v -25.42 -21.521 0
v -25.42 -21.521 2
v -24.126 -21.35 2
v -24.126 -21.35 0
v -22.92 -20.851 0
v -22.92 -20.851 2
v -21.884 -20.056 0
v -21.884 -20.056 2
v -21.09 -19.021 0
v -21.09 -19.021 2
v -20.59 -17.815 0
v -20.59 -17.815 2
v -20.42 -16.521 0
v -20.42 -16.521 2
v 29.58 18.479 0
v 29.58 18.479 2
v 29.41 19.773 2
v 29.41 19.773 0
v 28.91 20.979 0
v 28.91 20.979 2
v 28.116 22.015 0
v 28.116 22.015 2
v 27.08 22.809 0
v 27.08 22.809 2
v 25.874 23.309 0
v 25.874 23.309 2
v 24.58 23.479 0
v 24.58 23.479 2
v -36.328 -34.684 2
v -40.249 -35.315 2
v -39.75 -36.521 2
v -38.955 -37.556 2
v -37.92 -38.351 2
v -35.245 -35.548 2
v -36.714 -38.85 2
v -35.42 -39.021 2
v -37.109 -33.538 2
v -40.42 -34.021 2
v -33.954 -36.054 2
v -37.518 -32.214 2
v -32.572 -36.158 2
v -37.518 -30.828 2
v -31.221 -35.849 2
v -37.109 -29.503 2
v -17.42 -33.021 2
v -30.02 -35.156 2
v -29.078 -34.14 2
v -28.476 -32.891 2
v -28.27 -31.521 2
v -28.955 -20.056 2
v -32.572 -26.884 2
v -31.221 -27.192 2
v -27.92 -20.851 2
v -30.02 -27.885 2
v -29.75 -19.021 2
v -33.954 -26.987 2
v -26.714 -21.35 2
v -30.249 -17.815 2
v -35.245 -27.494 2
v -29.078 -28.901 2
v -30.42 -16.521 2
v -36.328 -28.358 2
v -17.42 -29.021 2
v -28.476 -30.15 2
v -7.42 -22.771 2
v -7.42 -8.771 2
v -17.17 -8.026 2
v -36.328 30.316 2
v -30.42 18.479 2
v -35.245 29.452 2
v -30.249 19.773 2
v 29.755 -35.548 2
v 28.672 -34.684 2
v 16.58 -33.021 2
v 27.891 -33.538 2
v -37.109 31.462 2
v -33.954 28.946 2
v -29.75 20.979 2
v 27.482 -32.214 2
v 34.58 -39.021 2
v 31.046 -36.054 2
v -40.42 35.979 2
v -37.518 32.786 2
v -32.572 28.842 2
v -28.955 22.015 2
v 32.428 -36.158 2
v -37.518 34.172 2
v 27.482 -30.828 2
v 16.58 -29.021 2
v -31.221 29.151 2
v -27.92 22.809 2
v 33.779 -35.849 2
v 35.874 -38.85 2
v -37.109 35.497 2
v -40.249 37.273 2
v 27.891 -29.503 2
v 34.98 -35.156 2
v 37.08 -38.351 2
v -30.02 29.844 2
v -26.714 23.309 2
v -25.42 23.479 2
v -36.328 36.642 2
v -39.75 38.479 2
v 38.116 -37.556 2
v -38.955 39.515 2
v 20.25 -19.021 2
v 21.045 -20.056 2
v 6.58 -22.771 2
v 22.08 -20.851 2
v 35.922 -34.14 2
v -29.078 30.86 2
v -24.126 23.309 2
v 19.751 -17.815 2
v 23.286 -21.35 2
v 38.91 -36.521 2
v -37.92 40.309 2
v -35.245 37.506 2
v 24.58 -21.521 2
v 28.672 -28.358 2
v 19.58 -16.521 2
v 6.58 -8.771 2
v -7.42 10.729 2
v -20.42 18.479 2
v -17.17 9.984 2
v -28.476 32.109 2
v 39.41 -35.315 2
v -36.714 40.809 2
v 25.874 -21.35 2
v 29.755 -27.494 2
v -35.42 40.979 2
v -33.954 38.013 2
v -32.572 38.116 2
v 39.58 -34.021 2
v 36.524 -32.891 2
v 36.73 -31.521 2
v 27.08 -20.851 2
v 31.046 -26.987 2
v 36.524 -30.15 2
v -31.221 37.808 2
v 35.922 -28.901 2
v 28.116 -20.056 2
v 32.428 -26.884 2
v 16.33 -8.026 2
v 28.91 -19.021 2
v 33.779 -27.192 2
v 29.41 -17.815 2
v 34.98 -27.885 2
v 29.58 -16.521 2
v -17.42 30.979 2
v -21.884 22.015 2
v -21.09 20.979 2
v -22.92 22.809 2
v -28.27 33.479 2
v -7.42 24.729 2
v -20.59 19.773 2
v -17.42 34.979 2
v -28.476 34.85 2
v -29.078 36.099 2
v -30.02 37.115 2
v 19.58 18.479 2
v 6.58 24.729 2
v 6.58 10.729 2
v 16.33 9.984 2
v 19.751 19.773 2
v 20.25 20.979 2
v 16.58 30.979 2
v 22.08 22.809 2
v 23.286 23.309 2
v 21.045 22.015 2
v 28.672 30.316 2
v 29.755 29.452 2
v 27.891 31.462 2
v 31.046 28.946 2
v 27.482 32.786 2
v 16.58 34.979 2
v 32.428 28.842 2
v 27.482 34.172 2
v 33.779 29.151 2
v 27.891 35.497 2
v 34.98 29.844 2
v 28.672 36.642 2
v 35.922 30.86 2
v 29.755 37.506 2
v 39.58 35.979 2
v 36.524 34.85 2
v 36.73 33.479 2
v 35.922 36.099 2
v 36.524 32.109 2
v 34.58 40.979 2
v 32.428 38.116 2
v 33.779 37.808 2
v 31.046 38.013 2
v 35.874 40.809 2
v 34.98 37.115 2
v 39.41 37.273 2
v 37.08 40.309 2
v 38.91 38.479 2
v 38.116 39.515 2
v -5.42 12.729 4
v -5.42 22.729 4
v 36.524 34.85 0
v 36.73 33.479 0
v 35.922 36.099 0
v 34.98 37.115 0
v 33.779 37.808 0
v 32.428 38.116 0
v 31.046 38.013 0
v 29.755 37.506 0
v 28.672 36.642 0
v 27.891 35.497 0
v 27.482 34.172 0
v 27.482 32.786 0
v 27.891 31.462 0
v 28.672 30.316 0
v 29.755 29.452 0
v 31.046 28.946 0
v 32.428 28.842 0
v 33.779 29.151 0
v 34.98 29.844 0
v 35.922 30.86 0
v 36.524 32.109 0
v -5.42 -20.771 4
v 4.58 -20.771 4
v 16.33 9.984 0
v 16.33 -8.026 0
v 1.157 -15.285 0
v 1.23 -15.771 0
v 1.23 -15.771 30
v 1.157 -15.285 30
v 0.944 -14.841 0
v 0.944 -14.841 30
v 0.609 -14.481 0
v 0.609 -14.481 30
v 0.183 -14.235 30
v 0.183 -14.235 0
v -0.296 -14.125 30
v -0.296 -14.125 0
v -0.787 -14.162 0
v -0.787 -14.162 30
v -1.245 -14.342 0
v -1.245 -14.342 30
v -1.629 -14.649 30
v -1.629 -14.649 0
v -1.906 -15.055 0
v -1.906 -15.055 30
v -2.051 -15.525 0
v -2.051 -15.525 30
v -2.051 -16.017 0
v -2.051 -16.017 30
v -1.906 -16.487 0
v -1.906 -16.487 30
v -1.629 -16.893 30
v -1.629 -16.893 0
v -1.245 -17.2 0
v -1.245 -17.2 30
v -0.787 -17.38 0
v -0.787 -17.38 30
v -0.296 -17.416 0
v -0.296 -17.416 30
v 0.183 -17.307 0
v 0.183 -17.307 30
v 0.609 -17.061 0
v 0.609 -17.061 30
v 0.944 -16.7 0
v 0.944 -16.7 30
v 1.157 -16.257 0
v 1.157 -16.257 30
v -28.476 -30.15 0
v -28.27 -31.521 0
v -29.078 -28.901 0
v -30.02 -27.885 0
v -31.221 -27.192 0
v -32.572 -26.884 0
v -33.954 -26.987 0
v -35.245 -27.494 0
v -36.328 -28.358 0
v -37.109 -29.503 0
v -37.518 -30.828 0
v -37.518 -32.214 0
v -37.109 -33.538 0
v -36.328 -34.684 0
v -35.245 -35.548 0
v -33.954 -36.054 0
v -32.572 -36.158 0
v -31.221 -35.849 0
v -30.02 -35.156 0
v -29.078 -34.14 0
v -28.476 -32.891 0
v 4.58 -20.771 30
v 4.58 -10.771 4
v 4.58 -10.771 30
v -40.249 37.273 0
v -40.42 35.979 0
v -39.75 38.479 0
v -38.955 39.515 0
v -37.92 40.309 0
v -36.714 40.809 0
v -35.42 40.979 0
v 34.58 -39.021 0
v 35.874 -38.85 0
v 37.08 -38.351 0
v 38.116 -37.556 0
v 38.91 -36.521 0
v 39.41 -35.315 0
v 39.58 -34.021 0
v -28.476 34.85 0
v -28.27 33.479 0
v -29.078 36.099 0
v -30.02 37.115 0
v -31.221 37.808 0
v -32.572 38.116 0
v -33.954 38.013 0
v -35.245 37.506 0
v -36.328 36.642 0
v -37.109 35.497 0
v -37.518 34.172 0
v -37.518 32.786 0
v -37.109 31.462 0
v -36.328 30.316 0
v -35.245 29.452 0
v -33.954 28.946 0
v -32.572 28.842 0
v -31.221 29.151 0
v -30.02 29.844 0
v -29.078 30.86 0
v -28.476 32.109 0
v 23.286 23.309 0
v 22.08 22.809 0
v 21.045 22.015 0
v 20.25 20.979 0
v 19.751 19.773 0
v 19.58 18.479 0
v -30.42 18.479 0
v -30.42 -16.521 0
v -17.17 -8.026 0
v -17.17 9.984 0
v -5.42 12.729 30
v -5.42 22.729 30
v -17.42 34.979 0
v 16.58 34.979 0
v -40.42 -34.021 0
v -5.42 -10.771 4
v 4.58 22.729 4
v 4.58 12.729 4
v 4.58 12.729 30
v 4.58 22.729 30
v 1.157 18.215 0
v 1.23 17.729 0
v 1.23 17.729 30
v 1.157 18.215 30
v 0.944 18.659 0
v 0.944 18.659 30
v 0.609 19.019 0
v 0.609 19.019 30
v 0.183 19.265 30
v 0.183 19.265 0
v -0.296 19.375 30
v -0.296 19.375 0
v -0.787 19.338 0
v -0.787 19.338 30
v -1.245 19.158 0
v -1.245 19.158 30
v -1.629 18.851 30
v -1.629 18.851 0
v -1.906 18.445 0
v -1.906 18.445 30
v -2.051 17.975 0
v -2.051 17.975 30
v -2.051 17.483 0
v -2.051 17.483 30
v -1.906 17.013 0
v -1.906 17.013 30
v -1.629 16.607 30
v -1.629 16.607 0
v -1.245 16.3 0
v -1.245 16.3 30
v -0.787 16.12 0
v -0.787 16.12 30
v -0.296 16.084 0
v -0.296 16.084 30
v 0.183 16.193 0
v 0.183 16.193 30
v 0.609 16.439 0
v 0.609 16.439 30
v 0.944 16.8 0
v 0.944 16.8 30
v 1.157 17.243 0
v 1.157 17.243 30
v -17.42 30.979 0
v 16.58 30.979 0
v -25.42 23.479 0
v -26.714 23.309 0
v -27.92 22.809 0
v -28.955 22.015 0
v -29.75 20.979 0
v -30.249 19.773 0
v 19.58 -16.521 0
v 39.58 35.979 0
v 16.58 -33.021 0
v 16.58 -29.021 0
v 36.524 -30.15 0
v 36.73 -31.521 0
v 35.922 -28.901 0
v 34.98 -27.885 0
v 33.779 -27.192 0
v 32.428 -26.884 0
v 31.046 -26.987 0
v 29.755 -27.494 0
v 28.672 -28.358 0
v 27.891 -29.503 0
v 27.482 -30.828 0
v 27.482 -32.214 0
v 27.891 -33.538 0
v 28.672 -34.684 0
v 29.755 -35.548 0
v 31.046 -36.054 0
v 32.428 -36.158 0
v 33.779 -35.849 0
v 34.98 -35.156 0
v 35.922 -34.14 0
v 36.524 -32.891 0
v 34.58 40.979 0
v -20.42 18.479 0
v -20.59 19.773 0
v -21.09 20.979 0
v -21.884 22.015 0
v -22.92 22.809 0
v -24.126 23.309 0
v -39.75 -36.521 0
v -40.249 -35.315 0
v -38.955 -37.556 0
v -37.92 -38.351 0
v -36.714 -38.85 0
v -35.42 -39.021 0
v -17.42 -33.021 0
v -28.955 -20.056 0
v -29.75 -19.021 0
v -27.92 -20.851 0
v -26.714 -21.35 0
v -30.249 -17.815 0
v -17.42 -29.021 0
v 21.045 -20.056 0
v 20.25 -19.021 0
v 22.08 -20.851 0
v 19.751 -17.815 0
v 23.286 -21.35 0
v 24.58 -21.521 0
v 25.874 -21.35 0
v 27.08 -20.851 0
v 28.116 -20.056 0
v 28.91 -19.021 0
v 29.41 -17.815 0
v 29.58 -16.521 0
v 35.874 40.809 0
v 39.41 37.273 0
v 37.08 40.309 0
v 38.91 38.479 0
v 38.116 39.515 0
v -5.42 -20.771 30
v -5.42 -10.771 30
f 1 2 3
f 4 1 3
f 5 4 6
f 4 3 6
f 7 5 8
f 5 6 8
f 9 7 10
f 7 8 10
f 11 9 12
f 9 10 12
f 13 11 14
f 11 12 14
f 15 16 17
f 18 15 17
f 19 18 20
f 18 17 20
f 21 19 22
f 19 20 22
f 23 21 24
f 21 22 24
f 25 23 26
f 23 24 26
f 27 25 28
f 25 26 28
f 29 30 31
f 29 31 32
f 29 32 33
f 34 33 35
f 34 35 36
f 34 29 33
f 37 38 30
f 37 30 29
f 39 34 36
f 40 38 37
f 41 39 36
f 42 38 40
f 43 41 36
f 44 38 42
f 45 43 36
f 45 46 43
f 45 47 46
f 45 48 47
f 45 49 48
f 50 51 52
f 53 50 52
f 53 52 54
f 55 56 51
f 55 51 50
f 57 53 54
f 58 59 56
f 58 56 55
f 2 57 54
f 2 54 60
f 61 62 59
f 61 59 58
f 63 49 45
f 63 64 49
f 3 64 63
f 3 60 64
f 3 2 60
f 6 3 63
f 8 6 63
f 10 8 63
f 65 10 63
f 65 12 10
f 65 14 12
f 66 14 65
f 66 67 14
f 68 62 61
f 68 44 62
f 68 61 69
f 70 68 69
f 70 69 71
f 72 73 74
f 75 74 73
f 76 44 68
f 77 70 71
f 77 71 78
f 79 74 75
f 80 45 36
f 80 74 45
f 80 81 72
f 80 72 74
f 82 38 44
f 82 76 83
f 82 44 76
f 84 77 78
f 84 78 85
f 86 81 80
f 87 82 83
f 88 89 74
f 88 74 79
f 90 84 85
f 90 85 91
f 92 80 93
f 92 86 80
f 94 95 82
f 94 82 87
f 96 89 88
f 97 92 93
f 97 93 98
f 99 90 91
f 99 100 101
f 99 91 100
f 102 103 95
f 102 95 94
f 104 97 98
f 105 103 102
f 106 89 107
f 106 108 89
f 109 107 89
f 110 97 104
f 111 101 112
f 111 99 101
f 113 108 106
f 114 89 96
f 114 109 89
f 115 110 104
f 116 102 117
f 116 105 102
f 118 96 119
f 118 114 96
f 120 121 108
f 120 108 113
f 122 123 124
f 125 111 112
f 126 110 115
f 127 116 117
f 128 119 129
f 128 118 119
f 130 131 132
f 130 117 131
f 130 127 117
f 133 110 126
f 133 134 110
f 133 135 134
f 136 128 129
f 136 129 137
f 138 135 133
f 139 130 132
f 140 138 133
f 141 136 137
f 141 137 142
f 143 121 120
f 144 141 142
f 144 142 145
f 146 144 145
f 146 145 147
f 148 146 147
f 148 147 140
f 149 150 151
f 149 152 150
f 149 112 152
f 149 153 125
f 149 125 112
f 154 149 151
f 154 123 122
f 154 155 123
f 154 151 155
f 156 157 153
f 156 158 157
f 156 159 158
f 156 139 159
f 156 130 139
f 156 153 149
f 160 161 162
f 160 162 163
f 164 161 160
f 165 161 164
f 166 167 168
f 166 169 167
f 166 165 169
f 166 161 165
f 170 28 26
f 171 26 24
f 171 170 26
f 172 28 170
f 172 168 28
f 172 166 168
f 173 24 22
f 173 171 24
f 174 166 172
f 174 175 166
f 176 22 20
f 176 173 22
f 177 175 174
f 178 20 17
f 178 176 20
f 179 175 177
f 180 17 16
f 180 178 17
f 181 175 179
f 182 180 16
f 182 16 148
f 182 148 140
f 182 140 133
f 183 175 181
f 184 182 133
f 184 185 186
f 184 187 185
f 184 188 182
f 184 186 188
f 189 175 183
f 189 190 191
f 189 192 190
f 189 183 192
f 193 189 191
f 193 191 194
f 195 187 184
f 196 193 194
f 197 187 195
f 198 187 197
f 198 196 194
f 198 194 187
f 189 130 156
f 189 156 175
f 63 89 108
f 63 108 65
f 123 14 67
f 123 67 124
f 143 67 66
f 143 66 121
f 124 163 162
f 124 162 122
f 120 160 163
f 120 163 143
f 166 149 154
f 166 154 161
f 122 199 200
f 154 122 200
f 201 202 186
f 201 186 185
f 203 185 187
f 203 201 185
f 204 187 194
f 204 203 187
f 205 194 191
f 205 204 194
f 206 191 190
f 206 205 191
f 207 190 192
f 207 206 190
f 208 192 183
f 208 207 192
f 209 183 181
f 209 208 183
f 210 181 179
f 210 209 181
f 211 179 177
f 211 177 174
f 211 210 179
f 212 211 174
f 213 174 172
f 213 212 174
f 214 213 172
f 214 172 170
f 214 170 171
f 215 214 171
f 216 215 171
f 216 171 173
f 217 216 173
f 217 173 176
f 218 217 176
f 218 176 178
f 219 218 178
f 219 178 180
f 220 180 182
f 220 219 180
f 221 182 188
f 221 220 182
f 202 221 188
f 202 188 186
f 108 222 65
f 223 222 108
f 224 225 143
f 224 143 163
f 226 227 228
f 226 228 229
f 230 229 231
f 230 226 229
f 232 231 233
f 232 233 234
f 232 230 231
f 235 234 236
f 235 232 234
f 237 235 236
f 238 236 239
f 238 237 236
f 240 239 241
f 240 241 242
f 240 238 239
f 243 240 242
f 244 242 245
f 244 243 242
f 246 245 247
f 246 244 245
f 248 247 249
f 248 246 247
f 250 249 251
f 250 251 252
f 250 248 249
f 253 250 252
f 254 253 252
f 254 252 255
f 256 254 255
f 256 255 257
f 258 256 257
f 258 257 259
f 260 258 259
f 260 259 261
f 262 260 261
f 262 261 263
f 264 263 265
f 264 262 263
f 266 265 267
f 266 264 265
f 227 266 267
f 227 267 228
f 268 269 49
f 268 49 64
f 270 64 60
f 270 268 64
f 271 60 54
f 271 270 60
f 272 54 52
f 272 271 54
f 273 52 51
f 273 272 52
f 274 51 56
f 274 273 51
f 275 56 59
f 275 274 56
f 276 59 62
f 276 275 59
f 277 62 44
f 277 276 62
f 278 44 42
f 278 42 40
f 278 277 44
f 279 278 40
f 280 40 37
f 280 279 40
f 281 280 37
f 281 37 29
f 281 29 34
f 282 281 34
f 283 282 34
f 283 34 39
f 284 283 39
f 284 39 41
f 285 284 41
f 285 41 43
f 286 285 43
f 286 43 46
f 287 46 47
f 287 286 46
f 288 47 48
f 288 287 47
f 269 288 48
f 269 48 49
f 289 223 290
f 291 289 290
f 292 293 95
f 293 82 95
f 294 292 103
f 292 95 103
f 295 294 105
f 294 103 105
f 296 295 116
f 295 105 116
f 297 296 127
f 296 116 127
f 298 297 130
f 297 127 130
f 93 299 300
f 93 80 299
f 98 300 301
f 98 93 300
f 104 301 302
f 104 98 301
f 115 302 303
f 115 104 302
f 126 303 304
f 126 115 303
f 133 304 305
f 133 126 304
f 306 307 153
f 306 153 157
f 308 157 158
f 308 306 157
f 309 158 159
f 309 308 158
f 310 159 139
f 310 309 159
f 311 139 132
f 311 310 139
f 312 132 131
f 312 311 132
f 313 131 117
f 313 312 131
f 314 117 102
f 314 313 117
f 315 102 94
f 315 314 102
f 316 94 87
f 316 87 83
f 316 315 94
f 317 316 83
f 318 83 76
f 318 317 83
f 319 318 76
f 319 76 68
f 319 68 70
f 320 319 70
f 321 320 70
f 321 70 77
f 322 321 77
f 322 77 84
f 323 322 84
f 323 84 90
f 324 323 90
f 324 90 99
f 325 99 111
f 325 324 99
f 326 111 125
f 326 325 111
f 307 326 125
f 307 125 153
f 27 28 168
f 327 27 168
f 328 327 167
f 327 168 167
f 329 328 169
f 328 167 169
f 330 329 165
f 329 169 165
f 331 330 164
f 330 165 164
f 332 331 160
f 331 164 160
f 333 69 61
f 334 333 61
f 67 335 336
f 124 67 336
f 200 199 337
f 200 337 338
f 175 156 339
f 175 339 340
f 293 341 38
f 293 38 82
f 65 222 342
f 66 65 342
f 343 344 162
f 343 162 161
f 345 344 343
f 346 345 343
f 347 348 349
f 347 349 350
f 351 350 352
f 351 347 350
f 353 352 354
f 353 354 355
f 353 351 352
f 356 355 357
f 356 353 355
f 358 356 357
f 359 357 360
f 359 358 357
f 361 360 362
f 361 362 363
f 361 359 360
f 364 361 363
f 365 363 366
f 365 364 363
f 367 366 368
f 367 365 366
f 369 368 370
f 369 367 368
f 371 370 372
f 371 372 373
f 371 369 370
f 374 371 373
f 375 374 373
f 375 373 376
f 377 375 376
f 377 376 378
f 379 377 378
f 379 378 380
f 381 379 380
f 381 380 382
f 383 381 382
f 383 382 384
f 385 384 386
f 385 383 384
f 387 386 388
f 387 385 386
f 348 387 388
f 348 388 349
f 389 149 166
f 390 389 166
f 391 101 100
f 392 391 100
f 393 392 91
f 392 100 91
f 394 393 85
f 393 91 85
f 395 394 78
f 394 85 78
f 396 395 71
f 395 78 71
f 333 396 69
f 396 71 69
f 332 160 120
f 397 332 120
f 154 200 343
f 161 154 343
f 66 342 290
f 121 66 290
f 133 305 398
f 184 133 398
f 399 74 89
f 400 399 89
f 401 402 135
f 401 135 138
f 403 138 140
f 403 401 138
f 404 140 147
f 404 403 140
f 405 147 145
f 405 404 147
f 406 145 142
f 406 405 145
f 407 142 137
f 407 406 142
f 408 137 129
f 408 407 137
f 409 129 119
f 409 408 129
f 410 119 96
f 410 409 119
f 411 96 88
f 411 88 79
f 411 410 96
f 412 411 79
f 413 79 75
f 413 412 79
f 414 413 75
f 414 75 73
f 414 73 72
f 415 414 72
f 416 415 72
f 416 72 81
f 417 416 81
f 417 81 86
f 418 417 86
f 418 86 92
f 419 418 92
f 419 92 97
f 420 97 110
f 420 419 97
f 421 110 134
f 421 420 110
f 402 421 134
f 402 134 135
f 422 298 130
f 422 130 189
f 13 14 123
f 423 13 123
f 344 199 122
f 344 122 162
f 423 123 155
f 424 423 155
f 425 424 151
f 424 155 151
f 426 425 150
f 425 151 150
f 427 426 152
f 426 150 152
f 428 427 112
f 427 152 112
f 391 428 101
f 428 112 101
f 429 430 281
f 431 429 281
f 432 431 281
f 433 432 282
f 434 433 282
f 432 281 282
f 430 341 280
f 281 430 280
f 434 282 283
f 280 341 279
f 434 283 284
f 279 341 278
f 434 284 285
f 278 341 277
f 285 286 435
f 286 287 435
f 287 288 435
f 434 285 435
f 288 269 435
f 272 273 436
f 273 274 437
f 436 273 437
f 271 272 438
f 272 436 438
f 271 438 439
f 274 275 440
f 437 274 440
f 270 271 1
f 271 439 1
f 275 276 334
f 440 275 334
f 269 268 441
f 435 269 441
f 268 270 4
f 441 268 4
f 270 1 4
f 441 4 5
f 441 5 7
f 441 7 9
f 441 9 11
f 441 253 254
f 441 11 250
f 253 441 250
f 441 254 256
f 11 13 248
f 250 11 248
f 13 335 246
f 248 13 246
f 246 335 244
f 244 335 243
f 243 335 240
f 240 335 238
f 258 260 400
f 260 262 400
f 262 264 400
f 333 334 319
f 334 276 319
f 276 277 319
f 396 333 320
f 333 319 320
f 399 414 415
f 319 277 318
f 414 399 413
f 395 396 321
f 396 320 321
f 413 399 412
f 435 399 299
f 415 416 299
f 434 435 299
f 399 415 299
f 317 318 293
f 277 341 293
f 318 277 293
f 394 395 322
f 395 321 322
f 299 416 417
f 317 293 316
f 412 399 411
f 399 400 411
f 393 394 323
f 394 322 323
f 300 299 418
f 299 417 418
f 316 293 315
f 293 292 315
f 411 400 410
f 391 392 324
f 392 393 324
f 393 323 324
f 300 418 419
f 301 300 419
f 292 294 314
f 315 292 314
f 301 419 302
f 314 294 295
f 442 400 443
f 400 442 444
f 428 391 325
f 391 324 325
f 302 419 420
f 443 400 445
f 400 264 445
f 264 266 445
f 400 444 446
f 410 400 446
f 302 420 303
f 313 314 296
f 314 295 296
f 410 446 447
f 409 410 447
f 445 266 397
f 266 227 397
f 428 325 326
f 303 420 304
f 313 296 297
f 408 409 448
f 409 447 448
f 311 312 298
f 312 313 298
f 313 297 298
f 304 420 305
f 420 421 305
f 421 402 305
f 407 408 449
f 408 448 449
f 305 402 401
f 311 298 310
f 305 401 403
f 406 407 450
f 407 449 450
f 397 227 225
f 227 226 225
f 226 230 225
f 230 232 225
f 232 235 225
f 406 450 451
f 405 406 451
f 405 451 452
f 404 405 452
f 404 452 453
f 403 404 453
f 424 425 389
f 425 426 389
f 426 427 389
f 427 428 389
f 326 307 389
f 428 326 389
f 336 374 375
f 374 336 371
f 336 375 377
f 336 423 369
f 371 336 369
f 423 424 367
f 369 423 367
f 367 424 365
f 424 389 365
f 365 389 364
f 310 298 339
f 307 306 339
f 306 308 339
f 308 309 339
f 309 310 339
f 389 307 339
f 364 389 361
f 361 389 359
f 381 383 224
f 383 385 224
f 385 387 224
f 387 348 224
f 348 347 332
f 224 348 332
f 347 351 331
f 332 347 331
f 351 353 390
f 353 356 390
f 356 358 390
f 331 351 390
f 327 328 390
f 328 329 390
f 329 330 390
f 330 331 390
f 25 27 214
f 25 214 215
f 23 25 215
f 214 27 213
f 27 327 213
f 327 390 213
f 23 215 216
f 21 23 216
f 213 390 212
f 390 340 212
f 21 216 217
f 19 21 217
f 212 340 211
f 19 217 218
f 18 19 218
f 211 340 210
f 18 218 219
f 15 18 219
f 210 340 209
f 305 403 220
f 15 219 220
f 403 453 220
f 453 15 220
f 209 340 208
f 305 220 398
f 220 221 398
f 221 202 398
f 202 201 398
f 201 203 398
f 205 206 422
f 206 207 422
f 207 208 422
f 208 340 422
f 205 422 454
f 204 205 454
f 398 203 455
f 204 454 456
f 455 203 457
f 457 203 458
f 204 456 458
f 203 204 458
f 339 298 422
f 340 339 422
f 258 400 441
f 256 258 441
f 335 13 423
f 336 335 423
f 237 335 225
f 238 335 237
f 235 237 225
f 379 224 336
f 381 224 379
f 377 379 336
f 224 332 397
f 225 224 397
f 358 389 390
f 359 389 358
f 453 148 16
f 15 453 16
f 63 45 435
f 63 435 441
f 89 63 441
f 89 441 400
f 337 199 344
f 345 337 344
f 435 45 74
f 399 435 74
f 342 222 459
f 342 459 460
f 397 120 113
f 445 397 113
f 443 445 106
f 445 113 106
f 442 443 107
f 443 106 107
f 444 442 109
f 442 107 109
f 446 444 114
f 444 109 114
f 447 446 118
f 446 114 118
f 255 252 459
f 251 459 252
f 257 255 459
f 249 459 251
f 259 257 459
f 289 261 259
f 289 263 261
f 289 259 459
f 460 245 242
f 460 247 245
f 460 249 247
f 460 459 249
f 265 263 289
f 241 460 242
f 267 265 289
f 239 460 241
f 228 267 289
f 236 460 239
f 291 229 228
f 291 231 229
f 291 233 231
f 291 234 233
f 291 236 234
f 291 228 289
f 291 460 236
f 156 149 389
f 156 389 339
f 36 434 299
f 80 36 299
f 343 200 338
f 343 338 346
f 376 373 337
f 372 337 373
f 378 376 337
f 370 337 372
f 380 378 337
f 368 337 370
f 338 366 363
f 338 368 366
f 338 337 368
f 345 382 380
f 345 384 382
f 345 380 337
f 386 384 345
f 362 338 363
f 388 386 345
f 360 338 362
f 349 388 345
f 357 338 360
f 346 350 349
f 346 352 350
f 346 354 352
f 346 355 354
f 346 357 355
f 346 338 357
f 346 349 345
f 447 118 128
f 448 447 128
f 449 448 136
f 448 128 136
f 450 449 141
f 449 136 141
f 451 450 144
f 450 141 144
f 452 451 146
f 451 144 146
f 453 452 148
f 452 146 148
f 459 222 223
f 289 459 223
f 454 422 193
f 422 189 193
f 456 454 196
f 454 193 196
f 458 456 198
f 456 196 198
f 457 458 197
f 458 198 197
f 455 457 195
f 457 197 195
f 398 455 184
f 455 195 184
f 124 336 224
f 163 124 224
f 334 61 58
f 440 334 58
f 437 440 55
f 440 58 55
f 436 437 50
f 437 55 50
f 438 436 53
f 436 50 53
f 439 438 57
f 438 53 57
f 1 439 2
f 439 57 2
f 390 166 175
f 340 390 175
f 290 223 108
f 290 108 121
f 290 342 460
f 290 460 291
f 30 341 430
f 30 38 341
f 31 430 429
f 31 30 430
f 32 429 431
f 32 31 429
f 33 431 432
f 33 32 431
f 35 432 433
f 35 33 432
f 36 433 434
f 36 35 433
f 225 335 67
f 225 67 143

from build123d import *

# Parameters (mm, degrees)
F0_W     = 10
F0_H     = 10
F0_R     = 1.65
F1_DEPTH = 30
F0_W_2   = 80
F0_H_2   = 80
F0_R_2   = 4.65
F0_W_3   = 33.5
F0_H_3   = 18.0101236328
F2_DEPTH = 2
F3_R     = 5
F4_SIZE  = 2
F5_W     = 34
F5_H     = 4
F6_DEPTH = 25


with BuildPart() as f1:
    # F0 (on Top) → F1 (new body)
    with BuildSketch(Plane.XY):
        with Locations((-0.4196270893, 17.7291296907)):
            Rectangle(F0_W, F0_H)
        with Locations((-0.4196270893, 17.7291296907)):
            Circle(F0_R, mode=Mode.SUBTRACT)
    extrude(amount=F1_DEPTH)



with BuildPart() as f1b:
    # F0 (on Top) → F1, piece 2 (new body)
    with BuildSketch(Plane.XY):
        with Locations((-0.4196270893, -15.7708703093)):
            Rectangle(F0_W, F0_H)
        with Locations((-0.4196270893, -15.7708703093)):
            Circle(F0_R, mode=Mode.SUBTRACT)
    extrude(amount=F1_DEPTH)


with BuildPart() as f1_1:
    add(f1.part)

    add(f1b.part)  # F2 merges F1b
    # F0 (on Top) → F2 (join)
    with BuildSketch(Plane.XY):
        with Locations((-0.4196270893, 0.9791296907)):
            Rectangle(F0_W_2, F0_H_2)
        with Locations((-32.9196270893, -31.5208703093)):
            Circle(F0_R_2, mode=Mode.SUBTRACT)
        with Locations((32.0803729107, -31.5208703093)):
            Circle(F0_R_2, mode=Mode.SUBTRACT)
        with Locations((-0.4196270893, -15.7708703093)):
            Rectangle(F0_W, F0_H, mode=Mode.SUBTRACT)
        with Locations((-32.9196270893, 33.4791296907)):
            Circle(F0_R_2, mode=Mode.SUBTRACT)
        with Locations((-0.4196270893, 0.9791296907)):
            Rectangle(F0_W_3, F0_H_3, mode=Mode.SUBTRACT)
        with Locations((-0.4196270893, 17.7291296907)):
            Rectangle(F0_W, F0_H, mode=Mode.SUBTRACT)
        with Locations((32.0803729107, 33.4791296907)):
            Circle(F0_R_2, mode=Mode.SUBTRACT)
    extrude(amount=F2_DEPTH)

    # F3
    f3_edges = [f1_1.edges().sort_by_distance(p)[0] for p in [
        (-40.419627, -39.02087, 1),
        (-40.419627, 40.97913, 1),
        (39.580373, -39.02087, 1),
        (39.580373, 40.97913, 1),
    ]]
    fillet(f3_edges, radius=F3_R)

    # F4
    f4_edges = [f1_1.edges().sort_by_distance(p)[0] for p in [
        (-0.419627, 22.72913, 2),
        (-0.419627, -10.77087, 2),
        (4.580373, -15.77087, 2),
        (4.580373, 17.72913, 2),
        (-0.419627, -20.77087, 2),
        (-0.419627, 12.72913, 2),
        (-5.419627, 17.72913, 2),
        (-5.419627, -15.77087, 2),
    ]]
    chamfer(f4_edges, length=F4_SIZE)

    # F5 (on face) → F6 (cut)
    with BuildSketch(Plane.XY.offset(2)):
        with BuildLine():
            Line((-20.4196270893, -16.5208703093), (-20.4196270893, 18.4791296907))
            ThreePointArc((-20.4196270893, 18.4791296907), (-21.8840931834, 22.0146635966), (-25.4196270893, 23.4791296907))
            ThreePointArc((-25.4196270893, 23.4791296907), (-28.9551609952, 22.0146635966), (-30.4196270893, 18.4791296907))
            Line((-30.4196270893, 18.4791296907), (-30.4196270893, -16.5208703093))
            ThreePointArc((-30.4196270893, -16.5208703093), (-28.9551609952, -20.0564042153), (-25.4196270893, -21.5208703093))
            ThreePointArc((-25.4196270893, -21.5208703093), (-21.8840931834, -20.0564042153), (-20.4196270893, -16.5208703093))
        make_face()
        with Locations((-0.4196270893, 32.9791296907)):
            Rectangle(F5_W, F5_H)
        with BuildLine():
            ThreePointArc((24.5803729107, 23.4791296907), (21.0448390048, 22.0146635966), (19.5803729107, 18.4791296907))
            Line((19.5803729107, 18.4791296907), (19.5803729107, -16.5208703093))
            ThreePointArc((19.5803729107, -16.5208703093), (21.0448390048, -20.0564042153), (24.5803729107, -21.5208703093))
            ThreePointArc((24.5803729107, -21.5208703093), (28.1159068166, -20.0564042153), (29.5803729107, -16.5208703093))
            Line((29.5803729107, -16.5208703093), (29.5803729107, 18.4791296907))
            ThreePointArc((29.5803729107, 18.4791296907), (28.1159068166, 22.0146635966), (24.5803729107, 23.4791296907))
        make_face()
        with Locations((-0.4196270893, -31.0208703093)):
            Rectangle(F5_W, F5_H)
    extrude(amount=-F6_DEPTH, mode=Mode.SUBTRACT)


solid = f1_1.part
